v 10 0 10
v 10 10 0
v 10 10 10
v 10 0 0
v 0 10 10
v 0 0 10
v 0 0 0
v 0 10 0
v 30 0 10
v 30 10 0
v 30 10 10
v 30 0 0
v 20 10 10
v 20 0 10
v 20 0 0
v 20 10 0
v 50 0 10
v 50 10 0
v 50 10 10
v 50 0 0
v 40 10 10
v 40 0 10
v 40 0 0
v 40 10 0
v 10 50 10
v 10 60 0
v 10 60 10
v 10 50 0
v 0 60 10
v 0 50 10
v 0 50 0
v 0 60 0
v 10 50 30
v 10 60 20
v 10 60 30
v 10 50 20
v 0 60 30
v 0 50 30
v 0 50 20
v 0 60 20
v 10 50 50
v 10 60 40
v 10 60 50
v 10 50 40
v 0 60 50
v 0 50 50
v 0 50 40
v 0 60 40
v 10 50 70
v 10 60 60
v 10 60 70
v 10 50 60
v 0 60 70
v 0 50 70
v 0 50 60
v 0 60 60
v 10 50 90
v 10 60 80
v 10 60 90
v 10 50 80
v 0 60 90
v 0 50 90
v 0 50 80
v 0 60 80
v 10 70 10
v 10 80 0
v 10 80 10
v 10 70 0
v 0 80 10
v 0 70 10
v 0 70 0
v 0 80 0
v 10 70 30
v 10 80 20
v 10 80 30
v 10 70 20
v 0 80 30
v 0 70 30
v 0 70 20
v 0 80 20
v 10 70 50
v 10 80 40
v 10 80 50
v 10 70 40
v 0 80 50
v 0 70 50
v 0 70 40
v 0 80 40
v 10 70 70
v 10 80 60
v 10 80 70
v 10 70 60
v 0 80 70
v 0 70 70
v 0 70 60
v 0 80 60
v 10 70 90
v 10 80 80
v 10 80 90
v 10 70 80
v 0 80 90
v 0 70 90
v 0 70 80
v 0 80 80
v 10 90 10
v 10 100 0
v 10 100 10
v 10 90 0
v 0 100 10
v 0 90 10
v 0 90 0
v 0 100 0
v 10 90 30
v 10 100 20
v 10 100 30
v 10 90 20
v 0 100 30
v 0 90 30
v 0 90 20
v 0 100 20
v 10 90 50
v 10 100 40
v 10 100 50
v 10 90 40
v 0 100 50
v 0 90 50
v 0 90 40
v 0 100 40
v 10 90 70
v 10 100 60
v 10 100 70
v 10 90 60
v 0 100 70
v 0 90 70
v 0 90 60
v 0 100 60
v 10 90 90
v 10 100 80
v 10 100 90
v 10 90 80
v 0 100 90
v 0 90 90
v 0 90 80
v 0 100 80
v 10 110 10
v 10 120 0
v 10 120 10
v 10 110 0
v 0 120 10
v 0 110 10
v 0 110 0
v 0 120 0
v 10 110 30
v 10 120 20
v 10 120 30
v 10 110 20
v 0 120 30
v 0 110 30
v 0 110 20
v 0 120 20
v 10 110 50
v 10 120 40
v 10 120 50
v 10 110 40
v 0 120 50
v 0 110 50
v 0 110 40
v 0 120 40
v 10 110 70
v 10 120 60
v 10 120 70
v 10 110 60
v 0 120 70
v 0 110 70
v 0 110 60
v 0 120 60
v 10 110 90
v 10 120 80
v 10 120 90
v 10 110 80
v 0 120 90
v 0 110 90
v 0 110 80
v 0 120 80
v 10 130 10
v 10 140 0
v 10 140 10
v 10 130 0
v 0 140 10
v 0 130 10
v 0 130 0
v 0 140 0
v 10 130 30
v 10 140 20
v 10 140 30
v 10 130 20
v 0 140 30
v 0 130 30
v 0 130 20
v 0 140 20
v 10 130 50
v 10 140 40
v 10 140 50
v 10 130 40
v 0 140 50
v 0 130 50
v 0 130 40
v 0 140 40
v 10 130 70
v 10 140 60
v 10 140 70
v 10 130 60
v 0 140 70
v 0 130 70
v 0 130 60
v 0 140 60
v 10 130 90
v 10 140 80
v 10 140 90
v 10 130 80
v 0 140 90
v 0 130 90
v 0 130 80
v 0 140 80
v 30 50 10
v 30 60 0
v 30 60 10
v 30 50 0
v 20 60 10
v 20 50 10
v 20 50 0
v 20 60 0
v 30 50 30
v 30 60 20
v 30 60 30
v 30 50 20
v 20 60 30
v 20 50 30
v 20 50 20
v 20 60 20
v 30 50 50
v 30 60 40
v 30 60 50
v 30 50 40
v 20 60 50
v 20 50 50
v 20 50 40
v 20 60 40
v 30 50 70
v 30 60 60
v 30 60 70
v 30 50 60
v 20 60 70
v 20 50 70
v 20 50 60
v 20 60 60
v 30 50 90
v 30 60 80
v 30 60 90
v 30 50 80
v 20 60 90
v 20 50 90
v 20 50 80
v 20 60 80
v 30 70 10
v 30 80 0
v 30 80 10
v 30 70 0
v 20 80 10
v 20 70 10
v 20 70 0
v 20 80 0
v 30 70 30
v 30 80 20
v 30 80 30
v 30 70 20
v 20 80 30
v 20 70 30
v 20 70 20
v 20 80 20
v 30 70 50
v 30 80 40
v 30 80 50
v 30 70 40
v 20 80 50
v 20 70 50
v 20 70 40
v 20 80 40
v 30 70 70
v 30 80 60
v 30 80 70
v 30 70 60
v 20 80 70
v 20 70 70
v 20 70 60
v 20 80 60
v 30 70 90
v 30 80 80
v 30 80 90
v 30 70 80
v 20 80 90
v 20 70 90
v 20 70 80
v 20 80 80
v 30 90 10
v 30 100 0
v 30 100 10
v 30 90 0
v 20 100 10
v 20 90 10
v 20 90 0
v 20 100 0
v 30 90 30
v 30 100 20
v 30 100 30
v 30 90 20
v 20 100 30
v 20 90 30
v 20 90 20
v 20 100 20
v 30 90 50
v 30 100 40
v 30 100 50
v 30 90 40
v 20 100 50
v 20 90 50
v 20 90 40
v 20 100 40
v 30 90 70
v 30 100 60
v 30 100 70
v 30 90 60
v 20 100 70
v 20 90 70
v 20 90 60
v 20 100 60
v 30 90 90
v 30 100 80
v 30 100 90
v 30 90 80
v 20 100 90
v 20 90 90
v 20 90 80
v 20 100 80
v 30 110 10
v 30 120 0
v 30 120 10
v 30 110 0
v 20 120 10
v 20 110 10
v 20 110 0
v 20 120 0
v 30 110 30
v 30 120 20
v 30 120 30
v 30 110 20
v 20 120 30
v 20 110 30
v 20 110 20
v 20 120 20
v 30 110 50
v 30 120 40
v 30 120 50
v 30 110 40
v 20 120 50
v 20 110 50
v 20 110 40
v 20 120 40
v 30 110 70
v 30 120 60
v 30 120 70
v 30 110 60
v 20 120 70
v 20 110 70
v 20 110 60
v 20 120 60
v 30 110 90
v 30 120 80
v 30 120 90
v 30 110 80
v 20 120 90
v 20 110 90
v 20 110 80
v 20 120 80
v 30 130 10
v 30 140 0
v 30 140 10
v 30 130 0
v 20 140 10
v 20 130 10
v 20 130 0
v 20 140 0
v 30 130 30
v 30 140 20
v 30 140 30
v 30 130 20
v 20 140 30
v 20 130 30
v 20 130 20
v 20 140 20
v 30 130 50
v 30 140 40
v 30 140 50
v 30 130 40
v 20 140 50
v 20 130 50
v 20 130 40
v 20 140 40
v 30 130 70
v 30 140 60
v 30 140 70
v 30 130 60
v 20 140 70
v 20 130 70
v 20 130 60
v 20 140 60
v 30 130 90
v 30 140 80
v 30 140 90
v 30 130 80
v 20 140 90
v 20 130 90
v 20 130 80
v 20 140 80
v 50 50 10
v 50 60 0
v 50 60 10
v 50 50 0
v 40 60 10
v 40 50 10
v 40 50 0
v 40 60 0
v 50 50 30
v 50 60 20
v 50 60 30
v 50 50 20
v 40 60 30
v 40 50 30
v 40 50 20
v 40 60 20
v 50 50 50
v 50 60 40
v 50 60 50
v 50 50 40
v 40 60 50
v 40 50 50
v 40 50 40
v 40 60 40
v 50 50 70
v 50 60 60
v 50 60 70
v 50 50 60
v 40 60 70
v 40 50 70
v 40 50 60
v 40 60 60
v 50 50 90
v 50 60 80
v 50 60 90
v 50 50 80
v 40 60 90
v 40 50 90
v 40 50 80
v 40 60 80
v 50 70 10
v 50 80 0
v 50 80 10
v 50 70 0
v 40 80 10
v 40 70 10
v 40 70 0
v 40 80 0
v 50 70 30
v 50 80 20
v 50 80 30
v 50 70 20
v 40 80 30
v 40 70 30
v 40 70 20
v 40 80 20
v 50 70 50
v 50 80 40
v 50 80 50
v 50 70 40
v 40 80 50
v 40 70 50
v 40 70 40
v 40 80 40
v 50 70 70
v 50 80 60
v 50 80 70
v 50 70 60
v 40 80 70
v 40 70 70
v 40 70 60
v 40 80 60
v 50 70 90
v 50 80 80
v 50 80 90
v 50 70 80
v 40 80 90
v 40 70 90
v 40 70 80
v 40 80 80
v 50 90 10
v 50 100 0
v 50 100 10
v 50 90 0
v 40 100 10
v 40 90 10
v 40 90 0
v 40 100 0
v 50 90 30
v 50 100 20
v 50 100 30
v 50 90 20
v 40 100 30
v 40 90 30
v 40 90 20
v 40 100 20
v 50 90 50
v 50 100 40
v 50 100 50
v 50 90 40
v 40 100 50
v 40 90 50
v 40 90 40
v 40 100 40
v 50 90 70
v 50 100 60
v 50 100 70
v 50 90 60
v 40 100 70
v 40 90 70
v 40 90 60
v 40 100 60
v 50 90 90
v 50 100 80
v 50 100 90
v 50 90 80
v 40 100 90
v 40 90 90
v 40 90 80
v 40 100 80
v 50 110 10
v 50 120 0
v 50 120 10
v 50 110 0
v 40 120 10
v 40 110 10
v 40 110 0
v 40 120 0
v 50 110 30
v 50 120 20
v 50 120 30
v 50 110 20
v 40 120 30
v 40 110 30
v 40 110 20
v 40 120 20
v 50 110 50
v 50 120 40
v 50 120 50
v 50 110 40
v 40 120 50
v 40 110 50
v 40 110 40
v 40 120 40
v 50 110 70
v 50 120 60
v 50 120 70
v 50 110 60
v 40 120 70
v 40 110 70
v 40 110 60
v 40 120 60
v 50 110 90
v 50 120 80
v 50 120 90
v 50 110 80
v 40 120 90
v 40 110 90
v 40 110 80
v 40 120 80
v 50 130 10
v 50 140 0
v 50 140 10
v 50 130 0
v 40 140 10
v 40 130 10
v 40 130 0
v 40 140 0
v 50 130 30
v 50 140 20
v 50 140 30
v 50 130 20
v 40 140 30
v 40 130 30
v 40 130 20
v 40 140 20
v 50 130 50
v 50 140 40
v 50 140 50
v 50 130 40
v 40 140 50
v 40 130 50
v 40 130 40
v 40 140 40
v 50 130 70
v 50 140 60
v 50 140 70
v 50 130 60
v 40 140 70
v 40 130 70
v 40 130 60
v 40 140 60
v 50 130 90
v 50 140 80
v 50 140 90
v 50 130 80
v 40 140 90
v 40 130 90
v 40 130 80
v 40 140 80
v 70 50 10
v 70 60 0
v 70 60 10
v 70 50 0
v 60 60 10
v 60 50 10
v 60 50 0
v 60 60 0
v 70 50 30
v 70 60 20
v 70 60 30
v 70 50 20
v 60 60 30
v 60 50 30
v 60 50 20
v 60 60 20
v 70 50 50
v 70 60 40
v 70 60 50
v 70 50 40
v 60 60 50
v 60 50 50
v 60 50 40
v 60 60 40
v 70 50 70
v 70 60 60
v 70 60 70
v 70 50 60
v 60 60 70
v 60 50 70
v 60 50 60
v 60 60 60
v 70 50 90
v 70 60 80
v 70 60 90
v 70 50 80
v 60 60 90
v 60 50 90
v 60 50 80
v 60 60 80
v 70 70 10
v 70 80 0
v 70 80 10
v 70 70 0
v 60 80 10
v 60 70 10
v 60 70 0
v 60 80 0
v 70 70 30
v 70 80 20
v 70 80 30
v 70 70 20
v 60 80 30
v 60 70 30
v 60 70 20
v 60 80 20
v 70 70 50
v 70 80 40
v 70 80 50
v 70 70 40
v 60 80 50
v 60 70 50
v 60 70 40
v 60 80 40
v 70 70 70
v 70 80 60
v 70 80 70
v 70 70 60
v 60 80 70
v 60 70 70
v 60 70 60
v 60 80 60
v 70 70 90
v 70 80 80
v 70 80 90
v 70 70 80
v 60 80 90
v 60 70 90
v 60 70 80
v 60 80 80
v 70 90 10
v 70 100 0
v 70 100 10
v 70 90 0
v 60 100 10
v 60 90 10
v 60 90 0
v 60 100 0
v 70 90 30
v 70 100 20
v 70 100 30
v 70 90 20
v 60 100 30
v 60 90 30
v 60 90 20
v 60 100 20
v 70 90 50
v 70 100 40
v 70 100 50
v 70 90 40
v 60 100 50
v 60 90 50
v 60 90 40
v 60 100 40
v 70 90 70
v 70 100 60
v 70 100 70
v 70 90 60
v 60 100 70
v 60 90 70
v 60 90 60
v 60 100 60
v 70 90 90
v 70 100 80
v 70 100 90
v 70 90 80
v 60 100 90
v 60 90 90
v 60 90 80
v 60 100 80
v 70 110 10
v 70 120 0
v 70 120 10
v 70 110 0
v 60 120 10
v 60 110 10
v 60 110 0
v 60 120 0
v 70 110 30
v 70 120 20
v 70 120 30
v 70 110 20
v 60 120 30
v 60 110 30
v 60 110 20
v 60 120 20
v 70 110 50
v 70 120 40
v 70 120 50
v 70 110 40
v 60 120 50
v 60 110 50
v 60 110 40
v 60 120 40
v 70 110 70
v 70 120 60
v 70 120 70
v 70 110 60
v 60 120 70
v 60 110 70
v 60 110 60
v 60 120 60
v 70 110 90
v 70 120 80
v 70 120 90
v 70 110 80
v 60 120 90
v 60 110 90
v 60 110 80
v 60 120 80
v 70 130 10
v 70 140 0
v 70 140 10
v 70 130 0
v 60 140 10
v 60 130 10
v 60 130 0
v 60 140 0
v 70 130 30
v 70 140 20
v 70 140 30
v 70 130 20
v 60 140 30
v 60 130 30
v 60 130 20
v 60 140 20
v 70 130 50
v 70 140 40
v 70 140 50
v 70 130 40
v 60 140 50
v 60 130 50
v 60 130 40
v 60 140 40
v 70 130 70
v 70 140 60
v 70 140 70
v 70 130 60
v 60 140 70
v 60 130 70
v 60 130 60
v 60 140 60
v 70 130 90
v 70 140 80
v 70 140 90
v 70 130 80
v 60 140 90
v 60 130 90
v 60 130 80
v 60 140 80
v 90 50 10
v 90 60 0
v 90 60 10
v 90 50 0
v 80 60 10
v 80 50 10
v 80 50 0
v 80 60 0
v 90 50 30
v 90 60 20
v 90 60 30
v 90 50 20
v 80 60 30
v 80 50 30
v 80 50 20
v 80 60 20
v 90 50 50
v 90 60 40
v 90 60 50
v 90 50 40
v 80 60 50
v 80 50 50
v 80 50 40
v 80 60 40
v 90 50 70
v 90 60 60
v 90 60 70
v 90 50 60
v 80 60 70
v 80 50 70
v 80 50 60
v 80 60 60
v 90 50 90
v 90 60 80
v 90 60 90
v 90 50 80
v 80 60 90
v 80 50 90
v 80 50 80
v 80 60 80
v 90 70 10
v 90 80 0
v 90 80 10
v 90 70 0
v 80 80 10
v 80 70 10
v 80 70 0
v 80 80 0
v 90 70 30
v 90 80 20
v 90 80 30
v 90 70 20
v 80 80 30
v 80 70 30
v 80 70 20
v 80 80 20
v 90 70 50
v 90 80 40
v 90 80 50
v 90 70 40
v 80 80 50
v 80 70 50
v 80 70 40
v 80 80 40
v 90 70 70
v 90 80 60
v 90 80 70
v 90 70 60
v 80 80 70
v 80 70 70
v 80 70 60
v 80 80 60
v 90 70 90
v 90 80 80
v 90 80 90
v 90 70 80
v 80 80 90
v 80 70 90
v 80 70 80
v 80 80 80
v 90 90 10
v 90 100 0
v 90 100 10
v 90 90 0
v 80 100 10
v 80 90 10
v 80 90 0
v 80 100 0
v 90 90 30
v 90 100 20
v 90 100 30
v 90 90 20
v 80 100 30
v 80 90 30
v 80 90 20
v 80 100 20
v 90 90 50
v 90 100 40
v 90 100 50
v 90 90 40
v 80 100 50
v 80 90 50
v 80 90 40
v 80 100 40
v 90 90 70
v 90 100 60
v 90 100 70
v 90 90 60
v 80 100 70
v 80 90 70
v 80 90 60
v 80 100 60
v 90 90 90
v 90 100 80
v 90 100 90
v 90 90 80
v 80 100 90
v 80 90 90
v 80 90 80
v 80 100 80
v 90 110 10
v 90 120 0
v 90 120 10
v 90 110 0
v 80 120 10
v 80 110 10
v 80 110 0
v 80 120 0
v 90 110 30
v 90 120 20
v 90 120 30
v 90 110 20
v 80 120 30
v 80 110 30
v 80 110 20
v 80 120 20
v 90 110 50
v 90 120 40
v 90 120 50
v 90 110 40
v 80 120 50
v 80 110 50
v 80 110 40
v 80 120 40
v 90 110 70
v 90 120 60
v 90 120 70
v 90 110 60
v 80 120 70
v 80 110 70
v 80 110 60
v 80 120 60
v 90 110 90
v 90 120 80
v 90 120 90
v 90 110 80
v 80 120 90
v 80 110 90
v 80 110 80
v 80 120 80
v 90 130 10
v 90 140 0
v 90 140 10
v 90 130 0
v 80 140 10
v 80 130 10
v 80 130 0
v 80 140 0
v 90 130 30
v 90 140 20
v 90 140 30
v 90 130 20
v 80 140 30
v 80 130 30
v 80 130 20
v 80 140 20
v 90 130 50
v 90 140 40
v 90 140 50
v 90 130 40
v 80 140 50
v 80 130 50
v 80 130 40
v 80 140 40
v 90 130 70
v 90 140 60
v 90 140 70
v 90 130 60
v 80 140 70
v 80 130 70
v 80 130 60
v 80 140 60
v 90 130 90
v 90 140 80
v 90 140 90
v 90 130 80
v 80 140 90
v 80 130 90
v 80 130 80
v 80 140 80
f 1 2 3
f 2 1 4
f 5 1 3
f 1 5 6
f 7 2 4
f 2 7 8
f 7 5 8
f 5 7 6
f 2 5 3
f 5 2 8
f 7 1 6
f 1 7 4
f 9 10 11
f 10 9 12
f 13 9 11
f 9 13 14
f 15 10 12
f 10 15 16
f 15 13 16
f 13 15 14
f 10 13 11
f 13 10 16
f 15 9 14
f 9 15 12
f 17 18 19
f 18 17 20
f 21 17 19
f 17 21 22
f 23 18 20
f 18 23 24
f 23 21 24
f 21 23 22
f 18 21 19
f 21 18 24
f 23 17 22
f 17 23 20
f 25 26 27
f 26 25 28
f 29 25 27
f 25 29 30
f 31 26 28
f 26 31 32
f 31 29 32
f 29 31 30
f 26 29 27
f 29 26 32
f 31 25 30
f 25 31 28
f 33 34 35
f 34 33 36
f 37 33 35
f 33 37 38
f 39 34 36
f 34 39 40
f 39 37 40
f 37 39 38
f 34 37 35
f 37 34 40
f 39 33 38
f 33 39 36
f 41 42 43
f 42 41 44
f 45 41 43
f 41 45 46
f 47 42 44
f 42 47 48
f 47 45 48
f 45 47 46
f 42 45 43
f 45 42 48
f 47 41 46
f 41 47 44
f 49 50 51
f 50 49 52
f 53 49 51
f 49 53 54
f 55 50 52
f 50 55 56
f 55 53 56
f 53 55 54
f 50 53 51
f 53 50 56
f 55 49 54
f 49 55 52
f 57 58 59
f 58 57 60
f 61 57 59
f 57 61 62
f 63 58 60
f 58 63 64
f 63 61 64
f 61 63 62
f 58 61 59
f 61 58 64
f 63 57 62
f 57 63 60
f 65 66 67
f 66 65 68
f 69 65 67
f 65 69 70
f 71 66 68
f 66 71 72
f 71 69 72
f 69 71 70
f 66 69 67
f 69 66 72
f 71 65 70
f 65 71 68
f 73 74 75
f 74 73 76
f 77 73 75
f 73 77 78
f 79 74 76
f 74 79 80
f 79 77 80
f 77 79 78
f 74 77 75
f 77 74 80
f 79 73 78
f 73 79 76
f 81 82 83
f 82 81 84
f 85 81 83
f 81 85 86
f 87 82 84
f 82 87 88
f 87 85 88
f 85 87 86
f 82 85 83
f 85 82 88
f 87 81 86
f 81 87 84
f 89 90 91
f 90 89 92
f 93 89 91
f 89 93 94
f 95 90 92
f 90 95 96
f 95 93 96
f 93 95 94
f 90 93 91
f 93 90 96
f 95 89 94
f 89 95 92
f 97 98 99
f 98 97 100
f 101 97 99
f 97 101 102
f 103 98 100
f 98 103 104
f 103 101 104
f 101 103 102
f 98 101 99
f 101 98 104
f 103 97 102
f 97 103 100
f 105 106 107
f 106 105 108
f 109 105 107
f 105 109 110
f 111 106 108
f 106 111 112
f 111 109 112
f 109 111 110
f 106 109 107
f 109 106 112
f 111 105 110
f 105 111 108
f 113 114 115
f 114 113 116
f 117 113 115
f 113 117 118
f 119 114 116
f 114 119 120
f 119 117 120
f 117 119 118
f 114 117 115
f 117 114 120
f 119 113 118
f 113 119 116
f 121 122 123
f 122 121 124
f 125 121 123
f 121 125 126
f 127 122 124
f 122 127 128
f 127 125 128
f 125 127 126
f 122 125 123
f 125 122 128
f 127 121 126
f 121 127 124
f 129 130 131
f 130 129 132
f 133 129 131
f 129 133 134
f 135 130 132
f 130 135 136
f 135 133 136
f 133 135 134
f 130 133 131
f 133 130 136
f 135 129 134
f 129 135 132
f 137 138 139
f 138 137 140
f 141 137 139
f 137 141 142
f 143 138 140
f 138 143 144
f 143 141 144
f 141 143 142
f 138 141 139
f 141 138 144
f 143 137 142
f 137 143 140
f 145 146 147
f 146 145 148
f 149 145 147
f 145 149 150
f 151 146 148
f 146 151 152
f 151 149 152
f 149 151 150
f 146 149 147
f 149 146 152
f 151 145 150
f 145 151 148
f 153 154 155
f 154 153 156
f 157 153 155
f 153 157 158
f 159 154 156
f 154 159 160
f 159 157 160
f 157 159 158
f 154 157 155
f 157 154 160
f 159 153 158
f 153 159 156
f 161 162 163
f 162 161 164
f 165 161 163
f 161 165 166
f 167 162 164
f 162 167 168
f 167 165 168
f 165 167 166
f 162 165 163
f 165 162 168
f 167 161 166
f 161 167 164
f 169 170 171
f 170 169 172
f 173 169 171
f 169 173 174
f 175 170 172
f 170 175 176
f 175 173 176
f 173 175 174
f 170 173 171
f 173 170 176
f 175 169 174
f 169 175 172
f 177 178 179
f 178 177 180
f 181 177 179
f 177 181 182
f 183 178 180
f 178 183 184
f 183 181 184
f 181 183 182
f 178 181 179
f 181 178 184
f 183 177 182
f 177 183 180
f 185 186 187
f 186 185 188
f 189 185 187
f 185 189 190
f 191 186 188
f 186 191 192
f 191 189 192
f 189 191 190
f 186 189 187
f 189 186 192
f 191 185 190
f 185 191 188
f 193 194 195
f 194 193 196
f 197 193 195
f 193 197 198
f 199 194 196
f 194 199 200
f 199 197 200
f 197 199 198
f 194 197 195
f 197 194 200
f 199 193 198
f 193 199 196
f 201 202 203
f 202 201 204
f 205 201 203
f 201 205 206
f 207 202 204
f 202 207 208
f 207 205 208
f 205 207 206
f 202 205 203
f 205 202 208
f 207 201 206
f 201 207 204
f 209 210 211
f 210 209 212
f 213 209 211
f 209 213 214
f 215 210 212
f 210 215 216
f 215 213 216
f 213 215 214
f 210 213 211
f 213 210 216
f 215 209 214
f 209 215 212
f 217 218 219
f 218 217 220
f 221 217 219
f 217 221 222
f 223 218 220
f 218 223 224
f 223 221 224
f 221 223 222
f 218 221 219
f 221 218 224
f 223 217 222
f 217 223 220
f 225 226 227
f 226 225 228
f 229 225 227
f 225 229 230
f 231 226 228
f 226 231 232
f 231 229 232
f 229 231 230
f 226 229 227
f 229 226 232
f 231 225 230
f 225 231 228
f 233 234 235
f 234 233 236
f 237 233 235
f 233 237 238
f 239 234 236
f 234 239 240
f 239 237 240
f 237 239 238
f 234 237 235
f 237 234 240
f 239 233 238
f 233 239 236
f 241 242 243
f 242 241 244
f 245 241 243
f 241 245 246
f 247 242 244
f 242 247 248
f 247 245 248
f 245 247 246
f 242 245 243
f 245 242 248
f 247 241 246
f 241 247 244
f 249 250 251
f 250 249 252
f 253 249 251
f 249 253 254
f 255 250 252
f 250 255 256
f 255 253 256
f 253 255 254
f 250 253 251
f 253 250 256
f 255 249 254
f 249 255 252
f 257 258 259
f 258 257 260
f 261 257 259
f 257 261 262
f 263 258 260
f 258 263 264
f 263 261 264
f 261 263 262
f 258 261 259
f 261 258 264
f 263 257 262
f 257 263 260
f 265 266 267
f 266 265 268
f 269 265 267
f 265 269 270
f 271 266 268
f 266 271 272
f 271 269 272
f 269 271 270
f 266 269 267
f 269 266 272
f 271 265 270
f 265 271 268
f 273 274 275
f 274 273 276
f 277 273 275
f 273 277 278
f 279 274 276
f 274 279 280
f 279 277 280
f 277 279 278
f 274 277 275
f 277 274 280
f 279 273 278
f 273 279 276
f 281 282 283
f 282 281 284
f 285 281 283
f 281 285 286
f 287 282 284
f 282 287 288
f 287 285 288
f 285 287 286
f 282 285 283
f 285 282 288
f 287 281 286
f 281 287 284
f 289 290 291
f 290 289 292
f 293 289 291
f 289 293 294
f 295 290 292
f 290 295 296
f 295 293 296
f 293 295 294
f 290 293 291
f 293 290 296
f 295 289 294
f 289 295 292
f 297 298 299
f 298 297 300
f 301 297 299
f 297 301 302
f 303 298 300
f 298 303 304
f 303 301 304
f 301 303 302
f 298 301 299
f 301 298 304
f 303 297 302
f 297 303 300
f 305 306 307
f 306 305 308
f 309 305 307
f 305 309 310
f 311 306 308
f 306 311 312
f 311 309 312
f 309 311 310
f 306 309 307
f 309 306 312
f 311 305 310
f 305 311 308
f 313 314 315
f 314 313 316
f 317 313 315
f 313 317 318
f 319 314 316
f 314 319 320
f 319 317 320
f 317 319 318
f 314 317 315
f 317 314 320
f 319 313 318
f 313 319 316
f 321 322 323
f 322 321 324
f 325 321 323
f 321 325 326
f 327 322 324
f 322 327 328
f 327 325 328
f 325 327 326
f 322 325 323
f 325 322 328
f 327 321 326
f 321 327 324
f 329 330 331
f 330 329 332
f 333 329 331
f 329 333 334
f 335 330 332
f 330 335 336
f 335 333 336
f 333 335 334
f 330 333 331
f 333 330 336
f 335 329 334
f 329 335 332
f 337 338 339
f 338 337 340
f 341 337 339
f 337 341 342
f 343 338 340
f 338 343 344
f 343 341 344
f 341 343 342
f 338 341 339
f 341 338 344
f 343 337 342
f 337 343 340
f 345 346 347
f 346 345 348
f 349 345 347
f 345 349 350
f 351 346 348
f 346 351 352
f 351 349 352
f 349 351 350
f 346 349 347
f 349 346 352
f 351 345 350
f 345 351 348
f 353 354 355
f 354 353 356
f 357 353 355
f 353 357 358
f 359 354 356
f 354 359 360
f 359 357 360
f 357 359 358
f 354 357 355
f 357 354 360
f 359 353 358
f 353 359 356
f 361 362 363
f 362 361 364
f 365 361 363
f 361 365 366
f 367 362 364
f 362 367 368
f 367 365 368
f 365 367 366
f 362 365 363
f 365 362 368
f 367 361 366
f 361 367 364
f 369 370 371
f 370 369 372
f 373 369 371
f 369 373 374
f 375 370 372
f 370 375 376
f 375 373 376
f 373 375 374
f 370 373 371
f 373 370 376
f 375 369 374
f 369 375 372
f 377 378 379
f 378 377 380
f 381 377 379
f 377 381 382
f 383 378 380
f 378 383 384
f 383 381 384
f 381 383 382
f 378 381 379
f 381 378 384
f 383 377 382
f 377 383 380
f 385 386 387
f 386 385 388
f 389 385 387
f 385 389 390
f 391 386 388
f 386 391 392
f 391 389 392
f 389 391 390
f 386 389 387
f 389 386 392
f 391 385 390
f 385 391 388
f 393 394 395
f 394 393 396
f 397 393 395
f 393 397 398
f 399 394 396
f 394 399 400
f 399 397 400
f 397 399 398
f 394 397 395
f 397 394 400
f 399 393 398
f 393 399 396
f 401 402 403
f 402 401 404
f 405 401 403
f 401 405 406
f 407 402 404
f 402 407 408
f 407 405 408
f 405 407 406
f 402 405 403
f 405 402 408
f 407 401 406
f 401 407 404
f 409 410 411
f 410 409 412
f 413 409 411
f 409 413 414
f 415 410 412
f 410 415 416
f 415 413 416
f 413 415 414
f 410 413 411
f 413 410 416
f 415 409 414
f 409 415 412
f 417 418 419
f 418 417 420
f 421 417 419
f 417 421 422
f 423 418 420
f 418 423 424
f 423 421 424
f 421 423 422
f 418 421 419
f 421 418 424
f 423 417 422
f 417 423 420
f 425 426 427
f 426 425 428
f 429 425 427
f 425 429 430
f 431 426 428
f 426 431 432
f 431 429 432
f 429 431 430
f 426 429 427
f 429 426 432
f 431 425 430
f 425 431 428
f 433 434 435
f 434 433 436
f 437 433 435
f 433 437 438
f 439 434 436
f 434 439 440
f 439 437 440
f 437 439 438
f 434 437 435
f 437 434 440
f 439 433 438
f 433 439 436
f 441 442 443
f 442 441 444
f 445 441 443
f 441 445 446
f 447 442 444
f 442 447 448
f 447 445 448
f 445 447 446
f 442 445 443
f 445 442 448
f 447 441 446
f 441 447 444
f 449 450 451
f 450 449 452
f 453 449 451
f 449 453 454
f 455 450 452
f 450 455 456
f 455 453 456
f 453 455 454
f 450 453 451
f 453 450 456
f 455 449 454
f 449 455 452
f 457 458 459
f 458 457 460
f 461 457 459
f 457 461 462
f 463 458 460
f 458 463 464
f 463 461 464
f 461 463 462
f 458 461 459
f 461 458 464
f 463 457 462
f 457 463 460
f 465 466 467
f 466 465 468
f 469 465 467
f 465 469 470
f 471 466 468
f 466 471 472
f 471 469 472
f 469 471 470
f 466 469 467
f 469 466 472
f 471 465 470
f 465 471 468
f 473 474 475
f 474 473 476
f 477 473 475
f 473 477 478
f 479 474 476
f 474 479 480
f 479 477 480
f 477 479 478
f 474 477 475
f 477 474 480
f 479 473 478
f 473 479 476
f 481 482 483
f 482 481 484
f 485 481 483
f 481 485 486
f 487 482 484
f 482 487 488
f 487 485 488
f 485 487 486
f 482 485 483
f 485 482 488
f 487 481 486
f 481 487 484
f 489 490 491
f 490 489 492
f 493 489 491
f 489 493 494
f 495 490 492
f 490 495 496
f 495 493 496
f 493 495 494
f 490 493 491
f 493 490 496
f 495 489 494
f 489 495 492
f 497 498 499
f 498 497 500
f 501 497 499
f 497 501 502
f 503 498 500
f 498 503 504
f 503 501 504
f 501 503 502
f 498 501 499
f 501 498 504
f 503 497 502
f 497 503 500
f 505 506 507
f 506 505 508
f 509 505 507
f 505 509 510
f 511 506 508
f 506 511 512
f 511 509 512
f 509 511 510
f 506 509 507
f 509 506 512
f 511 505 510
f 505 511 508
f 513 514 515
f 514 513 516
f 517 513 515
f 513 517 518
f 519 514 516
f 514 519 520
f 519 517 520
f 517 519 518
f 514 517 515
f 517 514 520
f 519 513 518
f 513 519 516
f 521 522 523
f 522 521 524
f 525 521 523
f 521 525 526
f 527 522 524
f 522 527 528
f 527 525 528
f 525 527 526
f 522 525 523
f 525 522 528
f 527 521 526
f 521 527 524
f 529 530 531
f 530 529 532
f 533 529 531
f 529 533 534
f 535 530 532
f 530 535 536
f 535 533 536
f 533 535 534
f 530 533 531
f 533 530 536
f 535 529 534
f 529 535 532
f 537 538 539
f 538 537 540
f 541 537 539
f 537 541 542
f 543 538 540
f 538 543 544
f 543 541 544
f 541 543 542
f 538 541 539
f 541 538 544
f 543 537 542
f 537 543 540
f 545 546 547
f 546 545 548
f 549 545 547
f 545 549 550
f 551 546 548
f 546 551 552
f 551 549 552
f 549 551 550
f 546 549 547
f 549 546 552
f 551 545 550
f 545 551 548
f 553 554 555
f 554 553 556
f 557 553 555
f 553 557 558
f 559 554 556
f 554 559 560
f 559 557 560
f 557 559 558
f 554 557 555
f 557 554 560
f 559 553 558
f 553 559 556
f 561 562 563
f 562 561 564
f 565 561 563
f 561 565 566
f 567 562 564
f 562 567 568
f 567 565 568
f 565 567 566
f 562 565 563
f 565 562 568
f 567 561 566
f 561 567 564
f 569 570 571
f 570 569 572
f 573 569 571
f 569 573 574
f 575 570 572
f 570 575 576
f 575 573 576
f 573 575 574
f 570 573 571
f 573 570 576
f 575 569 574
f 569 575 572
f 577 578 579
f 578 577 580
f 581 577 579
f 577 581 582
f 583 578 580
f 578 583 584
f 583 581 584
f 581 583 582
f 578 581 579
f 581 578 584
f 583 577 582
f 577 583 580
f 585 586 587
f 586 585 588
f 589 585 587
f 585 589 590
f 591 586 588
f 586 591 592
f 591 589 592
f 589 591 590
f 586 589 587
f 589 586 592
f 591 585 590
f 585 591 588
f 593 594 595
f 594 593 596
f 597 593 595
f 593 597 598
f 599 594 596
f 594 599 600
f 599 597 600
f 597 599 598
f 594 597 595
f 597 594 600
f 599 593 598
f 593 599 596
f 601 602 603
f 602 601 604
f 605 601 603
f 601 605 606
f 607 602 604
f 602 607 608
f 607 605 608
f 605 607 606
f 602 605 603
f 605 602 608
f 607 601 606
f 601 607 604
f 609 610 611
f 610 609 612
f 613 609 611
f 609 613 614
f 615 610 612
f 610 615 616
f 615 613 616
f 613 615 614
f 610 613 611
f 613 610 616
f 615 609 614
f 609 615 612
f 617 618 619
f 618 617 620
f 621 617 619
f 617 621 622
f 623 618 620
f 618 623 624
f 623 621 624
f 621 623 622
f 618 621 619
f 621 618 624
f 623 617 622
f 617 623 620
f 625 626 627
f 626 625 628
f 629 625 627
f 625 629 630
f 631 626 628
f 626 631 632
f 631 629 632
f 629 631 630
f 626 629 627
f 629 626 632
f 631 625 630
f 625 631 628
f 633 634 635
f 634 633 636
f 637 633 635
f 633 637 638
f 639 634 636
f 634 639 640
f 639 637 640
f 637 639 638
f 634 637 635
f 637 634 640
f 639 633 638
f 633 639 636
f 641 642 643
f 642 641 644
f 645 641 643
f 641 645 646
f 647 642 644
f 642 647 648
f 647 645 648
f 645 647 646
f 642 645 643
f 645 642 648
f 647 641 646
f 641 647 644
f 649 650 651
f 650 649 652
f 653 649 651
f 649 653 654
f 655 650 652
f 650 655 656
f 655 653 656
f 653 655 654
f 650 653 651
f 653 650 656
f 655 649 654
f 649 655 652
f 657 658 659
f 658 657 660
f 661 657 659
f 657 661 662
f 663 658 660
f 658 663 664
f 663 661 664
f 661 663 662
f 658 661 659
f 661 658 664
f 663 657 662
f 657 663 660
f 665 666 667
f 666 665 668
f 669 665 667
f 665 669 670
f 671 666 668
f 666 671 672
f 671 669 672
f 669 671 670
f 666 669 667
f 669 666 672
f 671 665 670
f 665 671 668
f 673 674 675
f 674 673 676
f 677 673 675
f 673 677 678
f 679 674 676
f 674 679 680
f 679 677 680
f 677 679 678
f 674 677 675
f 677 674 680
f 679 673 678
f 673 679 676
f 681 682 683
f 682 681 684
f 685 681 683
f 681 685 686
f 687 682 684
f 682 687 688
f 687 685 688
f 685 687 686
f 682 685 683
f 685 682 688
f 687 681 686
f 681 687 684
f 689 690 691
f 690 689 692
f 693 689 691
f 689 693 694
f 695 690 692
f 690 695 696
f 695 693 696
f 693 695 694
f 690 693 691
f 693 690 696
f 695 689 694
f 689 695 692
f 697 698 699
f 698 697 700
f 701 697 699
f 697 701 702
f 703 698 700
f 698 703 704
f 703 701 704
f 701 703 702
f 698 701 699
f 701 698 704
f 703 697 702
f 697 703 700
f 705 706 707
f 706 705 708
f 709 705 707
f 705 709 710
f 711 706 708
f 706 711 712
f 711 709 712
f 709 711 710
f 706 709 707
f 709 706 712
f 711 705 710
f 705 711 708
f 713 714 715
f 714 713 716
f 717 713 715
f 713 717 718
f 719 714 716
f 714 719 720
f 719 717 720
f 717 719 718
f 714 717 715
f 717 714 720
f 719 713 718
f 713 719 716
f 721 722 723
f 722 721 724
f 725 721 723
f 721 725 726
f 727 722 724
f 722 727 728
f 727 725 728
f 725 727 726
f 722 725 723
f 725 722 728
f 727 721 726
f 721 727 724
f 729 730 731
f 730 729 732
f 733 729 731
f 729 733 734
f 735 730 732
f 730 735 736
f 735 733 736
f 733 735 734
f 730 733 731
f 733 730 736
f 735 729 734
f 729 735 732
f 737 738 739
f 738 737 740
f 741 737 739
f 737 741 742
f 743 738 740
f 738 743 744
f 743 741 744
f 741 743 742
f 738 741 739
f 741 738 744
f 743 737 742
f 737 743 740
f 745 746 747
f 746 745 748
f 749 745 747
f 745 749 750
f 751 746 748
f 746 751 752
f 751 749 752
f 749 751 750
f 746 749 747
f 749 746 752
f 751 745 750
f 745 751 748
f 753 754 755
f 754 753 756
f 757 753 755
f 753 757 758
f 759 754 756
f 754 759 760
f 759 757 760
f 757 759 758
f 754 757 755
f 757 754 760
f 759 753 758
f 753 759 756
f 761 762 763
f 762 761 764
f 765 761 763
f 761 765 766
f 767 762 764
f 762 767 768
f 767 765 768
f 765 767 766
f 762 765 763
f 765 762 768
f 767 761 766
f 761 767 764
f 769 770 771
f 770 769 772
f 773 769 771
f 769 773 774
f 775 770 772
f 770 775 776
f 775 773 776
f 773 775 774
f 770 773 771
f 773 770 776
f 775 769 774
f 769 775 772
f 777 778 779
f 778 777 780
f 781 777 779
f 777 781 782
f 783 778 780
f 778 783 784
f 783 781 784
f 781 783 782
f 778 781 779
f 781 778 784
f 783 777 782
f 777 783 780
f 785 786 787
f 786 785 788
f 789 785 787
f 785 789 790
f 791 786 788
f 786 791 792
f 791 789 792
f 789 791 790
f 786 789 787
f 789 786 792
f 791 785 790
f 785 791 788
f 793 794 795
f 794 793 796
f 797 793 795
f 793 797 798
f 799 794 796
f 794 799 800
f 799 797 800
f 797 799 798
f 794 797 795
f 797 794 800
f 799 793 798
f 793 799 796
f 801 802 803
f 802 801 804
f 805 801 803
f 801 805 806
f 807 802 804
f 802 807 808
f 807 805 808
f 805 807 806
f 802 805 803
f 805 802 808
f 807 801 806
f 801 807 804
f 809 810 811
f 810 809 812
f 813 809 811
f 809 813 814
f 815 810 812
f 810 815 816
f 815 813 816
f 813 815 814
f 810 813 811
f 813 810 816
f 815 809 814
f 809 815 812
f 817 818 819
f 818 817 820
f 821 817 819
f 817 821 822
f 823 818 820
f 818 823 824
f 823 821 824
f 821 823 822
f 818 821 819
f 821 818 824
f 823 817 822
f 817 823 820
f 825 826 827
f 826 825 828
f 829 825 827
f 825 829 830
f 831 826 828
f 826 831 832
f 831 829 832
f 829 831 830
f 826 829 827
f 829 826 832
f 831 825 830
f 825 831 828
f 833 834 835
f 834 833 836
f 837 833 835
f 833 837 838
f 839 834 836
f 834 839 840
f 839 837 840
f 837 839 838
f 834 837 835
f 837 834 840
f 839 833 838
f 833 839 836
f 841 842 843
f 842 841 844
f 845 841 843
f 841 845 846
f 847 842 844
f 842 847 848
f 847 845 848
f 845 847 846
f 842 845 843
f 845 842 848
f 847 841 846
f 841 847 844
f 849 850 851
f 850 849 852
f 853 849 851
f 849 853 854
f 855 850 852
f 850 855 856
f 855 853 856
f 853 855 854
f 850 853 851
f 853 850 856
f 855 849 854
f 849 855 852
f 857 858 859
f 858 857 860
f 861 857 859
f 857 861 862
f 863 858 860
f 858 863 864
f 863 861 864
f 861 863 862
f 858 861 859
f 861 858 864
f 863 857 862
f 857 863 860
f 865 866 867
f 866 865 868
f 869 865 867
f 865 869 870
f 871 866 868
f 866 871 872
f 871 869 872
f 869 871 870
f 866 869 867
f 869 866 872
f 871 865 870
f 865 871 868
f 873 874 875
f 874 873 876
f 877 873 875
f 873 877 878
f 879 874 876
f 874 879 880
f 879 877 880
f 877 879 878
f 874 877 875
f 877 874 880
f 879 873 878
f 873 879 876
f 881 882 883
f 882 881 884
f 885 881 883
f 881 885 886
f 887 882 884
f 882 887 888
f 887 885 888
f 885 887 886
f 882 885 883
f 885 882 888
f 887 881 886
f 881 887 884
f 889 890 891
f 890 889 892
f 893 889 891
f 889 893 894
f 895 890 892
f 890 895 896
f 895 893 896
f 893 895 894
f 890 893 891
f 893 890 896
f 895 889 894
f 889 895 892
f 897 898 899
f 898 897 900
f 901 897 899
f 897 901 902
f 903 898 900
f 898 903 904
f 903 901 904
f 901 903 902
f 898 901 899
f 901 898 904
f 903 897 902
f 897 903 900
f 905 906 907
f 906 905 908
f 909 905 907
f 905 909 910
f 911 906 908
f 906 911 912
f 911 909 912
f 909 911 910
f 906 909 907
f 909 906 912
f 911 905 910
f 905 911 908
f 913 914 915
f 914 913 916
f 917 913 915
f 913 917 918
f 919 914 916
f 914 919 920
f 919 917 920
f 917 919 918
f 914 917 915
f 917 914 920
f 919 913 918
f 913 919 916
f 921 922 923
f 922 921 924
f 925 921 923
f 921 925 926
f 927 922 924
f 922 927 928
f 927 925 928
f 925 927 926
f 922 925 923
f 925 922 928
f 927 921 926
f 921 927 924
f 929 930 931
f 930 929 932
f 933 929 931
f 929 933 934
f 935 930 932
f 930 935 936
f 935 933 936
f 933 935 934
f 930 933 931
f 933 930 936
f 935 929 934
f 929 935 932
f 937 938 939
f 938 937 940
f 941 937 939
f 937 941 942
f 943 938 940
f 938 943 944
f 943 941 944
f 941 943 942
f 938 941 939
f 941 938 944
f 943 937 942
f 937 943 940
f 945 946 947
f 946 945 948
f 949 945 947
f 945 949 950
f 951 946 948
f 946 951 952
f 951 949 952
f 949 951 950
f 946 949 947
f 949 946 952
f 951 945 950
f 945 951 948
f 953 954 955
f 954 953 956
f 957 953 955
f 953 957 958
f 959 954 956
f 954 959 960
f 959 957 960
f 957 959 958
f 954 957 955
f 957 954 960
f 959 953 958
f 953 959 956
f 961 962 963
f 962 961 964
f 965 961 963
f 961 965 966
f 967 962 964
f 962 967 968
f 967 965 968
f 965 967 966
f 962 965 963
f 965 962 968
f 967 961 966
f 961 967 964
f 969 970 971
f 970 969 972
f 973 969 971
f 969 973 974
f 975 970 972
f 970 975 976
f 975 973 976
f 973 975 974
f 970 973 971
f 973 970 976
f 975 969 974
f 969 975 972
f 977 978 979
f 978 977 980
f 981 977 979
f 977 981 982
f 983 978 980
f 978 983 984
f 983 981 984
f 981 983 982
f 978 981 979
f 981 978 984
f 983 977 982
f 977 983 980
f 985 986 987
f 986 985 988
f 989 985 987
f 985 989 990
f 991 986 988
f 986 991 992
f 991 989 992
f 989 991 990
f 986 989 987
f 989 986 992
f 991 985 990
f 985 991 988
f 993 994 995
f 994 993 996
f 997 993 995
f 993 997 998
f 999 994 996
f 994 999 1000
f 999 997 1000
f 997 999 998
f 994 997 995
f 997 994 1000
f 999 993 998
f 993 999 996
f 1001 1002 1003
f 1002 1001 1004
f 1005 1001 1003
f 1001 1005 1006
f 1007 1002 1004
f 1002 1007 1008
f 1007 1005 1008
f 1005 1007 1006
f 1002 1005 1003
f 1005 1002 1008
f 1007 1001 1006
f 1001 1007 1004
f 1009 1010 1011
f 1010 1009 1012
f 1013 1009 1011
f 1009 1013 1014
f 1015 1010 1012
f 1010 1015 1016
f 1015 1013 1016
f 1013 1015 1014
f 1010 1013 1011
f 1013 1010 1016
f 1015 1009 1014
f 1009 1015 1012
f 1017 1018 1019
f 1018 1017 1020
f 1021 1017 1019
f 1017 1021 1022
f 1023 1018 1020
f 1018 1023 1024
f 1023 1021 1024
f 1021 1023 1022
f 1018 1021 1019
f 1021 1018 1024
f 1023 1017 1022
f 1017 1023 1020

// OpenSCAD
module layout(scale) {
    for (i = [0:$children-1]) {
        translate([i*scale, 0, 0]) children(i);
    }
}

scale(10) {
    layout(2) {
        color("red") cube();
        color([0, 1, 0]) cube();
        color("#0000ff") cube();
    }

    steps = 4;
    translate([0, 5, 0]) for (r = [0:steps], g = [0:steps], b = [0:steps]) {
        translate([r,g,b]*2) color([r, g, b]/steps) cube();
    }
}
